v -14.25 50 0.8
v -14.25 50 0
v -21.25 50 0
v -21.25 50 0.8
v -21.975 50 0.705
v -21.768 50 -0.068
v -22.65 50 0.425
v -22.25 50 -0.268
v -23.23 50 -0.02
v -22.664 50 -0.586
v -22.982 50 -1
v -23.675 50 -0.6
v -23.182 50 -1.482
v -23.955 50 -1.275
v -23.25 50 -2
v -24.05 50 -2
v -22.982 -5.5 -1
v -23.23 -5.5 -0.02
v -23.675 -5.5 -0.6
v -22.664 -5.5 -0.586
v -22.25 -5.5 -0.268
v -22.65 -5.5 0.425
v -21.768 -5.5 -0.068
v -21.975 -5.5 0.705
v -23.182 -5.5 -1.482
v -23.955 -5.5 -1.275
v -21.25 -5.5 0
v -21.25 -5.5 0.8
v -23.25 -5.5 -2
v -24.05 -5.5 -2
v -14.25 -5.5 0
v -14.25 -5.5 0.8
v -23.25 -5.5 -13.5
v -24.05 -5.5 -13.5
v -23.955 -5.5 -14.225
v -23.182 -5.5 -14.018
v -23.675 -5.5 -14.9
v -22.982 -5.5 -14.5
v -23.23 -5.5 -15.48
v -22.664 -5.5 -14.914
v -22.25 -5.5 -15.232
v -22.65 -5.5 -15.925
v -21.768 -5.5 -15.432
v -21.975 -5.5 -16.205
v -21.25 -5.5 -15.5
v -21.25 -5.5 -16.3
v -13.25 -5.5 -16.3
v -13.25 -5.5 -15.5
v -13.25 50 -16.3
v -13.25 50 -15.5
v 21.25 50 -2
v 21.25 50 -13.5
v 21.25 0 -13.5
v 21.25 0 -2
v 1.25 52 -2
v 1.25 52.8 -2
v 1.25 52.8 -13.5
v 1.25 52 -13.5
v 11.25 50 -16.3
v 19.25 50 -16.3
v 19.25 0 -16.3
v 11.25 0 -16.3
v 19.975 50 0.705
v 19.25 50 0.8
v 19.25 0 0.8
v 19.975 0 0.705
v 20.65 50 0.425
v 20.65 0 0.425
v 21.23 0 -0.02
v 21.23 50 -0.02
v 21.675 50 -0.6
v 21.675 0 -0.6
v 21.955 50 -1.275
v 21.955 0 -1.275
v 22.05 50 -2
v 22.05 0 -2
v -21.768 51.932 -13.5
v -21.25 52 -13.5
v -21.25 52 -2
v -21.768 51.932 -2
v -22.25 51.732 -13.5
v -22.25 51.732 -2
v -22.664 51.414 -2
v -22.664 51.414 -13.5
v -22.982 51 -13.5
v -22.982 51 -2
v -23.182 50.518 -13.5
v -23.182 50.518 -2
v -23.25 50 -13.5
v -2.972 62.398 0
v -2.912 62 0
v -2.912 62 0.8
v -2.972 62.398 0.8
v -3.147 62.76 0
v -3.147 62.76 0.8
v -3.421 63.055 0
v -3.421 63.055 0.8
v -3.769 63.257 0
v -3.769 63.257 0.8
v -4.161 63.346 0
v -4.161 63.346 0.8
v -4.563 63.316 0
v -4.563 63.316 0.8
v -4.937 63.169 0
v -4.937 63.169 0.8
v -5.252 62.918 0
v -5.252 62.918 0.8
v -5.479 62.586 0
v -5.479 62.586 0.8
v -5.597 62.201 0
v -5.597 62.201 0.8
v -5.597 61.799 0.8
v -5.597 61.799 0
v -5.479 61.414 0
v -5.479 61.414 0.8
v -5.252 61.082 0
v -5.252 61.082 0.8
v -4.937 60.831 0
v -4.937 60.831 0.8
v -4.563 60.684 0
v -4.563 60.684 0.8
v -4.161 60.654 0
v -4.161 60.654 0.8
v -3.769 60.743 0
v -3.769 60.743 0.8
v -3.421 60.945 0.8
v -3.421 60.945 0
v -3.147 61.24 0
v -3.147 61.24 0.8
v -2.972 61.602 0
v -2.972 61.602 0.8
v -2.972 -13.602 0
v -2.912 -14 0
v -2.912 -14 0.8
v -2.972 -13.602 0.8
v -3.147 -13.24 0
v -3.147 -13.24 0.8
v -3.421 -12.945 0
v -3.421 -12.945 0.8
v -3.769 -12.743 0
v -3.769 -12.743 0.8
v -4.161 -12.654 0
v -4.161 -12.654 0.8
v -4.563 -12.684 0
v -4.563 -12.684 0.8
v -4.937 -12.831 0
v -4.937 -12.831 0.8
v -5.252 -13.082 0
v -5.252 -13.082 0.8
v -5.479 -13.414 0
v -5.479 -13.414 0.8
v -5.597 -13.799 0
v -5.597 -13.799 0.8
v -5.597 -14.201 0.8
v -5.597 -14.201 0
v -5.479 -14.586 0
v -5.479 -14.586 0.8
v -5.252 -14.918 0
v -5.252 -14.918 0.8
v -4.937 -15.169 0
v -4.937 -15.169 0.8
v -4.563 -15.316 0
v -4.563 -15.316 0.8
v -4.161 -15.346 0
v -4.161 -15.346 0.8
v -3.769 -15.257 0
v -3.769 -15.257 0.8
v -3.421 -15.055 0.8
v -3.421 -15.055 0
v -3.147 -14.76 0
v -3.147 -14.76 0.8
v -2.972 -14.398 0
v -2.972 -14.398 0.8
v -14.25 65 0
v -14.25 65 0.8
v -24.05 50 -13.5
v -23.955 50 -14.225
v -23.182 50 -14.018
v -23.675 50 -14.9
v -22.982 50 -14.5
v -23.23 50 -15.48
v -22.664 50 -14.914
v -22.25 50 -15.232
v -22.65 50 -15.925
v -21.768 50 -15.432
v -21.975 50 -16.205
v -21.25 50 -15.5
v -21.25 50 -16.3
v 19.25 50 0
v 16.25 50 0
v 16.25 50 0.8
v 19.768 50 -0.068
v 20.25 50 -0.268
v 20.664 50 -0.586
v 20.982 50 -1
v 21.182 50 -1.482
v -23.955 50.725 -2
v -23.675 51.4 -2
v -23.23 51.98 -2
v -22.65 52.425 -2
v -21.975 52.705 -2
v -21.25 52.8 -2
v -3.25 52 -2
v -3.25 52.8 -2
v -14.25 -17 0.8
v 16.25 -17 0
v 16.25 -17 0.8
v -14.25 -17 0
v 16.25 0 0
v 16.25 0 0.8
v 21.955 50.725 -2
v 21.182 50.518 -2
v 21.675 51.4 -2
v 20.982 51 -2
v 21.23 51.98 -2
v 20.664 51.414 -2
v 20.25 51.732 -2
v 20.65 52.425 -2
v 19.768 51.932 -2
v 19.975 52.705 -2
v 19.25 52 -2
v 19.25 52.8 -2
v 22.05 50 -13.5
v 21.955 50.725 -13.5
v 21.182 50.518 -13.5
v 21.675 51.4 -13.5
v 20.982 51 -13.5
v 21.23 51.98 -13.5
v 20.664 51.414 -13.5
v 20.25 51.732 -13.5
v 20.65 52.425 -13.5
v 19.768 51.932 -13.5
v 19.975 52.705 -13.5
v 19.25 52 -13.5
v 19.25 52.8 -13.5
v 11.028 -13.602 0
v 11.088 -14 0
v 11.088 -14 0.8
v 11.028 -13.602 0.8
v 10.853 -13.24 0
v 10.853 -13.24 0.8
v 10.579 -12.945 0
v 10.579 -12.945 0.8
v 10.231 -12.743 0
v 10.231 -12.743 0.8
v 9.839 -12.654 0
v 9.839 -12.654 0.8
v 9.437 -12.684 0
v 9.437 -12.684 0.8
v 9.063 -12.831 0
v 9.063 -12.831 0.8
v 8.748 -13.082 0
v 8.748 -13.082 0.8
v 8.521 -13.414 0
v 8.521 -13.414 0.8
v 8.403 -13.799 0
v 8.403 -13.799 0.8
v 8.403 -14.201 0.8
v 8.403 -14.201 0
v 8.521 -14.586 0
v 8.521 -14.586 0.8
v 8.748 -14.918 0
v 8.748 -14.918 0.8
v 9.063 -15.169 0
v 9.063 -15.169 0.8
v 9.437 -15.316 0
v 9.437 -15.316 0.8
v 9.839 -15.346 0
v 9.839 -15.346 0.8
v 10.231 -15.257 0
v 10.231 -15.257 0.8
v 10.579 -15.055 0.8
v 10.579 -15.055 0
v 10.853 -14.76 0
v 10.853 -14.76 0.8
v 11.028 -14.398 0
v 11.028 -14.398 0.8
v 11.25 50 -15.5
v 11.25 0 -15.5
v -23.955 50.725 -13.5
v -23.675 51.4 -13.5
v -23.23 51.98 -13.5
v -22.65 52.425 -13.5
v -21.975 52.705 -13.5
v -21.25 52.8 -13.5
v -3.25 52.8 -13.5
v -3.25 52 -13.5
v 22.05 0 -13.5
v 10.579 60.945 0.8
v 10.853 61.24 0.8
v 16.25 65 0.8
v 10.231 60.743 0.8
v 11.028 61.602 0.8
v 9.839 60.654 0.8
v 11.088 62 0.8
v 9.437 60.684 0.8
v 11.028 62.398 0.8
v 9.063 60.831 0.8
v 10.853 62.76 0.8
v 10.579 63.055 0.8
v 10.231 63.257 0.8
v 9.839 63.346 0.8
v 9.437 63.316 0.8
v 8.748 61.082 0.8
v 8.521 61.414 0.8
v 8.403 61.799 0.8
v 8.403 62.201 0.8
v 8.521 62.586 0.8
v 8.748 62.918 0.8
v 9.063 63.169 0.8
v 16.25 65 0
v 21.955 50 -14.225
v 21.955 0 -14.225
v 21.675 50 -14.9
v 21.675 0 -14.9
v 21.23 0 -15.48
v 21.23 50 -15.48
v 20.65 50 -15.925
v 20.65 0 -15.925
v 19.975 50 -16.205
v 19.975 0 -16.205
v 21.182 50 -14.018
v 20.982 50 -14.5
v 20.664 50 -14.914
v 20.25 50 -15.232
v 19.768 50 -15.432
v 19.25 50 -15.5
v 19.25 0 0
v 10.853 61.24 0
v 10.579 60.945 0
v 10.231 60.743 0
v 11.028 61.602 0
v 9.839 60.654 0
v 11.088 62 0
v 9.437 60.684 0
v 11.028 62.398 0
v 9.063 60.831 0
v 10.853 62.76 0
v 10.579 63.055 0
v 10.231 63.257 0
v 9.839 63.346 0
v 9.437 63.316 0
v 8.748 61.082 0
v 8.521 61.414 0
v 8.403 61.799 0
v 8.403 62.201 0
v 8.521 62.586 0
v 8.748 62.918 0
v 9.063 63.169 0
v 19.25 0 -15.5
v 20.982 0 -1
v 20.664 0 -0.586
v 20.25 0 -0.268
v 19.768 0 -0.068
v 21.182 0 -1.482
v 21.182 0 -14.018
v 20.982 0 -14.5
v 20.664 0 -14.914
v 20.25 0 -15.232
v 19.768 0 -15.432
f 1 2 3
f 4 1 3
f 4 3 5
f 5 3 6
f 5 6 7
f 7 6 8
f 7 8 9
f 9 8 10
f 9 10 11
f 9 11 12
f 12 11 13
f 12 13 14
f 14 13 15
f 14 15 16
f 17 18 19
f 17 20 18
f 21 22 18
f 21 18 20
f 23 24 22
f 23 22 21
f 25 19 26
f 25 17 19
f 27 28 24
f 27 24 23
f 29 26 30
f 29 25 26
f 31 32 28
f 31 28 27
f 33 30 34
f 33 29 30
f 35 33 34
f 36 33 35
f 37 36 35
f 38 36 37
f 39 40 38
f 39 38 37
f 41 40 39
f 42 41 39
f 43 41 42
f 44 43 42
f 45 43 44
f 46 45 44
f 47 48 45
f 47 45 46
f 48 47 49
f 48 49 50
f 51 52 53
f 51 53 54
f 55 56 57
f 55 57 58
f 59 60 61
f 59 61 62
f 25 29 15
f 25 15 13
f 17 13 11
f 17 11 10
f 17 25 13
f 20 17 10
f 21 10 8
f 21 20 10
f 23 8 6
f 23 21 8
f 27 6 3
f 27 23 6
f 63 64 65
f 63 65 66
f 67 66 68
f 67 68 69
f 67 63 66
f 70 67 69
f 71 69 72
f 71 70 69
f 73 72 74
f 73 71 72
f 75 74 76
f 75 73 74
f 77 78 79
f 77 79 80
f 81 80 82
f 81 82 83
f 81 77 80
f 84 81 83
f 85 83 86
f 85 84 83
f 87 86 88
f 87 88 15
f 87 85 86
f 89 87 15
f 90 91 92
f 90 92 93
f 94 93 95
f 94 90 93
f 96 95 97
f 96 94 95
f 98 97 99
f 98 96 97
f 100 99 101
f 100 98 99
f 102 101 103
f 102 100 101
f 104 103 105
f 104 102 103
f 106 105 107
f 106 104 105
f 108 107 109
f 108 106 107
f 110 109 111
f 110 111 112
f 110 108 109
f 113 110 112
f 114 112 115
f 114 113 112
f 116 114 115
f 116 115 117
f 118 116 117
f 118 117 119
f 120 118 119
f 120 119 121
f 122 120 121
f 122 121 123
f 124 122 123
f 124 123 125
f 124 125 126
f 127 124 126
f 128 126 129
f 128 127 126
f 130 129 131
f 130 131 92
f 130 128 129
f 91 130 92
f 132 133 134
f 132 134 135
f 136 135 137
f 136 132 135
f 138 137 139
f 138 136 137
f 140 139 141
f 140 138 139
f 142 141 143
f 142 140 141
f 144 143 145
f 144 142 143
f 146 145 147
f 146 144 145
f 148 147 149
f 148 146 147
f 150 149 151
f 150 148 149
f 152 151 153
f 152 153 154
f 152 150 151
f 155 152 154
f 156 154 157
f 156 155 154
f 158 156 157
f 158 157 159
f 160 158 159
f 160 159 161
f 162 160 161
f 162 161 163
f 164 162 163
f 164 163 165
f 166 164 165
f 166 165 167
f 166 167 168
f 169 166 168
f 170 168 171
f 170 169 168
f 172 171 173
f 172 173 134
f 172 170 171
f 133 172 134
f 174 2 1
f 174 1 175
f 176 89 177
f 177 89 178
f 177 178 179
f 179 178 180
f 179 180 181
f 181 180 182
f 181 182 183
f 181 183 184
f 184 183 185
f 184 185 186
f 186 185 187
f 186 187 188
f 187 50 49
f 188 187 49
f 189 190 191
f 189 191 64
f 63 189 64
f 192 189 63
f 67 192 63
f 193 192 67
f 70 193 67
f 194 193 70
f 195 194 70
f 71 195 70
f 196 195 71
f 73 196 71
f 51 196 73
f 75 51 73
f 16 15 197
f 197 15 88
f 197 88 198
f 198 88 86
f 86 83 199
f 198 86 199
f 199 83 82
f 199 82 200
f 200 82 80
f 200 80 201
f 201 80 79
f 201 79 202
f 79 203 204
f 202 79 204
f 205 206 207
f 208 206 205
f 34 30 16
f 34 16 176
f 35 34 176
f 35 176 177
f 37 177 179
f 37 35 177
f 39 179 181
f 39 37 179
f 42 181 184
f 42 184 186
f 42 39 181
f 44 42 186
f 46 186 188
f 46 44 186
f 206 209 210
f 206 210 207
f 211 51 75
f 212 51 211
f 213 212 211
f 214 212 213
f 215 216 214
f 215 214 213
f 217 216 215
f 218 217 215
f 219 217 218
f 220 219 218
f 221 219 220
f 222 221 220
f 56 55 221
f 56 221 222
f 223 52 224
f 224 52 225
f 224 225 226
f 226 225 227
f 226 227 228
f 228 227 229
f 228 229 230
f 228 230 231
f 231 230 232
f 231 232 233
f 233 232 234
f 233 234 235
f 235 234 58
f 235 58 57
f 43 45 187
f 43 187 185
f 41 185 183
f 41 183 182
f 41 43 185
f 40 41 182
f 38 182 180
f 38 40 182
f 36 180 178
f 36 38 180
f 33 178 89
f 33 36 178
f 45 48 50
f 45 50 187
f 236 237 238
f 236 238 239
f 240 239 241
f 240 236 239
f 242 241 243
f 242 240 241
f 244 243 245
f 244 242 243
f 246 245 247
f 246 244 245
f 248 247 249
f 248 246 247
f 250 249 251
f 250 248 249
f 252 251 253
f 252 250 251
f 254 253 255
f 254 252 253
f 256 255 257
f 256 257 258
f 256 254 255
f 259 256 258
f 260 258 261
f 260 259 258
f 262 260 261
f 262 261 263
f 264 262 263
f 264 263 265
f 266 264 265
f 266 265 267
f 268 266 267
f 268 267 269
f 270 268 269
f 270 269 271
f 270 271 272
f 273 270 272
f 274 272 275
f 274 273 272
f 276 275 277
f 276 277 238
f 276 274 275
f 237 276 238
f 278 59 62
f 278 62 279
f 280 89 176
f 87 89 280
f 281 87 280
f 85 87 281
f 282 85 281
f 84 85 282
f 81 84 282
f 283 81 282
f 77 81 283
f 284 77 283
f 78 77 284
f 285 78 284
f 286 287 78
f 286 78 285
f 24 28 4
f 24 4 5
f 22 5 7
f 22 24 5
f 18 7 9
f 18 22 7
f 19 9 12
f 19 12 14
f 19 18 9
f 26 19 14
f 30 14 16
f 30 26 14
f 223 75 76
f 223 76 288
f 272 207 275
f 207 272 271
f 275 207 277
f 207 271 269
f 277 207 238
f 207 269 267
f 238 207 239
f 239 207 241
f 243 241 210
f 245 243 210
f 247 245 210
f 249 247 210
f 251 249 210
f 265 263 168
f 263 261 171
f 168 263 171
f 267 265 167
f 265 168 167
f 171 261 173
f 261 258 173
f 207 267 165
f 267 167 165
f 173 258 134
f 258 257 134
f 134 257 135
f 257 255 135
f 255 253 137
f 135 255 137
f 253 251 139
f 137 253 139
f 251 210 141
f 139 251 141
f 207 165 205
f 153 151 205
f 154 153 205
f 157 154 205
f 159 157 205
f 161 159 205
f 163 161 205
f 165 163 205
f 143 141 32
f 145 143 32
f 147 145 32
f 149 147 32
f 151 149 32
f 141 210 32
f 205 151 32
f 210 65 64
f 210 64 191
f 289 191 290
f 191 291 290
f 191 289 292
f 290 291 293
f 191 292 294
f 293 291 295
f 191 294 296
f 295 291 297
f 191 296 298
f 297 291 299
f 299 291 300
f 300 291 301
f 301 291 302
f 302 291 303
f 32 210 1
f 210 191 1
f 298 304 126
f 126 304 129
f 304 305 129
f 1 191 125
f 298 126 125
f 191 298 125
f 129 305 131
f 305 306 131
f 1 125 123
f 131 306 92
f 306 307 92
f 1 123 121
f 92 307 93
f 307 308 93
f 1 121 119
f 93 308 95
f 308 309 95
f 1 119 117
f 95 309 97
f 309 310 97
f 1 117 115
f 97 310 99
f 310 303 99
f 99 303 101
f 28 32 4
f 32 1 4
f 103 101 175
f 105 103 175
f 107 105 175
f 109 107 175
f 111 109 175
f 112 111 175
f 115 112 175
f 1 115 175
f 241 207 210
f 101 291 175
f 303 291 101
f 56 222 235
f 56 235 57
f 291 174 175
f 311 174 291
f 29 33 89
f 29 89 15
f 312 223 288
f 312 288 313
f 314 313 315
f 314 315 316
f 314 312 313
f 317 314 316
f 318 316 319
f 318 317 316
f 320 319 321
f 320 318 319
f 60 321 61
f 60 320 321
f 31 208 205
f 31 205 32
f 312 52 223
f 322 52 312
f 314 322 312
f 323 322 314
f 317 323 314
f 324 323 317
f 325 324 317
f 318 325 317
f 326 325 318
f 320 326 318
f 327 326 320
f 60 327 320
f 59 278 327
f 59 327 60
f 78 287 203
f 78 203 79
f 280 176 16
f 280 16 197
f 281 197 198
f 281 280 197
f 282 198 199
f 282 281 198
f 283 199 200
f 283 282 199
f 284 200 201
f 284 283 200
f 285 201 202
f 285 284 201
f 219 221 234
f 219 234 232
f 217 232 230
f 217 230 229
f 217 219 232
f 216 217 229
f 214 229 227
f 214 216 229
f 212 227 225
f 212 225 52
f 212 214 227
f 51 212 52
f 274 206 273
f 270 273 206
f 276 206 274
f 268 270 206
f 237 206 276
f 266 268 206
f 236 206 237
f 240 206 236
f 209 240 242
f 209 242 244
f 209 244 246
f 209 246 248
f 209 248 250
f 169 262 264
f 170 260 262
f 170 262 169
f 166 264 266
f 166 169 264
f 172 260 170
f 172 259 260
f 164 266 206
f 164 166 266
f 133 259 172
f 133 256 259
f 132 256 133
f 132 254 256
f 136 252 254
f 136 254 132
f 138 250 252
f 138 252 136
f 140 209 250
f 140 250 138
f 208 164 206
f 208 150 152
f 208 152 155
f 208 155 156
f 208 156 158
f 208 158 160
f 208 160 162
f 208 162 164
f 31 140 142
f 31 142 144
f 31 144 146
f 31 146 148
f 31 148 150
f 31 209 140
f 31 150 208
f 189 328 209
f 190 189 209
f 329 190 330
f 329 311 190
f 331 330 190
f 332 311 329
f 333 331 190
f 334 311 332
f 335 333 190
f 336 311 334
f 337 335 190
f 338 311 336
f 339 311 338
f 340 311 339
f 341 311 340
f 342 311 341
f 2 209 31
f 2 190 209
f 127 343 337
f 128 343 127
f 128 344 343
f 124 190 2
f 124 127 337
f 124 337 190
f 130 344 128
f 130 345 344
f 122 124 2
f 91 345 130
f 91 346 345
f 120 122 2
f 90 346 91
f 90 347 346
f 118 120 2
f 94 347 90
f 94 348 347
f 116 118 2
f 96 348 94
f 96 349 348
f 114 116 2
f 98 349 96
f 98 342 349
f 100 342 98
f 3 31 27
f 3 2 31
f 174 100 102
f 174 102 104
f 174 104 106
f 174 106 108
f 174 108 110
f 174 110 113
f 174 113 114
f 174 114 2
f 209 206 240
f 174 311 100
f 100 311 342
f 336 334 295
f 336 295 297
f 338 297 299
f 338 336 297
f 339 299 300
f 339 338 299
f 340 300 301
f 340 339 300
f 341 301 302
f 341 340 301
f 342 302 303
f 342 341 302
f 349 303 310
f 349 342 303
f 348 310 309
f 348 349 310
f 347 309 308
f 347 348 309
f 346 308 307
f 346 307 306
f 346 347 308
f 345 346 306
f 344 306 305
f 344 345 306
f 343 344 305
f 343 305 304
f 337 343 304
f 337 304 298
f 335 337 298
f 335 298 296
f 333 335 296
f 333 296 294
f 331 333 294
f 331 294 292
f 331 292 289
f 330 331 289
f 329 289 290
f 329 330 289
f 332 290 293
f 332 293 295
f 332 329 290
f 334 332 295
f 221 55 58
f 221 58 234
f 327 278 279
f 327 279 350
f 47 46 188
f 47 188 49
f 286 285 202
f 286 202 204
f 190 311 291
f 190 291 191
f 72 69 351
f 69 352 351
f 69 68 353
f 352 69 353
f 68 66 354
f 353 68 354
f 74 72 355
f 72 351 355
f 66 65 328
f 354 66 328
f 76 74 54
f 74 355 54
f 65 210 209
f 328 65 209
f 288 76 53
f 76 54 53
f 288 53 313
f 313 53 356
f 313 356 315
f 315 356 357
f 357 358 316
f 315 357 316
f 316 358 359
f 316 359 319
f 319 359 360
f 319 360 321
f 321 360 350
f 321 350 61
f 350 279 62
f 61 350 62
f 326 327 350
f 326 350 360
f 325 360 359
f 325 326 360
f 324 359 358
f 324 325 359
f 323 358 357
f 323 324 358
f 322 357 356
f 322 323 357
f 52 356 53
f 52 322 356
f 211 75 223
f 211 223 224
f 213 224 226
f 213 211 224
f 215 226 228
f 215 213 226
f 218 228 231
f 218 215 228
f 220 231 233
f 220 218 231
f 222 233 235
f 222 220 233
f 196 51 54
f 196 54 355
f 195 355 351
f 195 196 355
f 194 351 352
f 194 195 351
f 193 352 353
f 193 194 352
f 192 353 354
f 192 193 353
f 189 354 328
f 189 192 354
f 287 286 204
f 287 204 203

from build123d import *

# Parameters (mm, degrees)
SKETCH1_R                      = 1.35
BASE_FLANGE1_DEPTH             = 0.8
EDGE_FLANGE1_STRIP_W           = 7.2
EDGE_FLANGE1_STRIP_H           = 0.8
EDGE_FLANGE1_STRIP_CUT_DEPTH   = 50
EDGE_FLANGE1_STRIP_2_W         = 7.2
EDGE_FLANGE1_STRIP_2_H         = 0.8
EDGE_FLANGE1_STRIP_CUT_2_DEPTH = 55.5
EDGE_FLANGE1_DEPTH             = 50
EDGE_FLANGE1_BEND_DEPTH        = 55.5
EDGE_FLANGE4_DEPTH             = 11.5
EDGE_FLANGE4_BEND_DEPTH        = 11.5
EDGE_FLANGE5_DEPTH             = 50
EDGE_FLANGE5_BEND_DEPTH        = 55.5


# Sheet-metal steps are written as plain solids
with BuildPart() as part:
    # Sketch1 → Base-Flange1 (new body)
    with BuildSketch(Plane.XY):
        Polygon((16.25, 0), (16.25, -17), (-14.25, -17), (-14.25, -5.5), (-23.25, -5.5), (-23.25, 50), (-14.25, 50), (-14.25, 65), (16.25, 65), (16.25, 50), (21.25, 50), (21.25, 0), align=None)
        with Locations((9.737756115, -14)):
            Circle(SKETCH1_R, mode=Mode.SUBTRACT)
        with Locations((-4.262243885, -14)):
            Circle(SKETCH1_R, mode=Mode.SUBTRACT)
        with Locations((9.737756115, 62)):
            Circle(SKETCH1_R, mode=Mode.SUBTRACT)
        with Locations((-4.262243885, 62)):
            Circle(SKETCH1_R, mode=Mode.SUBTRACT)
    extrude(amount=BASE_FLANGE1_DEPTH)

    # Edge-Flange1 strip (across the edge) → Edge-Flange1 strip cut (cut)
    with BuildSketch(Plane(origin=(21.25, 50, 0), x_dir=(-1, 0, 0), z_dir=(0, -1, 0))):
        with Locations((-1.6, -0.4)):
            Rectangle(EDGE_FLANGE1_STRIP_W, EDGE_FLANGE1_STRIP_H)
    extrude(amount=EDGE_FLANGE1_STRIP_CUT_DEPTH, mode=Mode.SUBTRACT)

    # Edge-Flange1 strip 2 (across the edge) → Edge-Flange1 strip cut 2 (cut)
    with BuildSketch(Plane(origin=(-23.25, -5.5, 0), x_dir=(1, 0, 0), z_dir=(0, 1, 0))):
        with Locations((-1.6, -0.4)):
            Rectangle(EDGE_FLANGE1_STRIP_2_W, EDGE_FLANGE1_STRIP_2_H)
    extrude(amount=EDGE_FLANGE1_STRIP_CUT_2_DEPTH, mode=Mode.SUBTRACT)

    # Edge-Flange1 section (across the edge) → Edge-Flange1 (add)
    with BuildSketch(Plane(origin=(21.25, 50, 0), x_dir=(-1, 0, 0), z_dir=(0, -1, 0))):
        with BuildLine():
            Line((-0.8, 2), (-0.8, 13.5))
            Line((-0.8, 13.5), (0, 13.5))
            Line((0, 13.5), (0, 2))
            ThreePointArc((0, 2), (0.585786438, 0.585786438), (2, 0))
            Line((2, 0), (2, -0.8))
            ThreePointArc((2, -0.8), (0.020101013, 0.020101013), (-0.8, 2))
        make_face()
    extrude(amount=EDGE_FLANGE1_DEPTH)

    # Edge-Flange1 section 2 (across the edge) → Edge-Flange1 bend (add)
    with BuildSketch(Plane(origin=(-23.25, -5.5, 0), x_dir=(1, 0, 0), z_dir=(0, 1, 0))):
        with BuildLine():
            Line((-0.8, 2), (-0.8, 13.5))
            Line((-0.8, 13.5), (0, 13.5))
            Line((0, 13.5), (0, 2))
            ThreePointArc((0, 2), (0.585786438, 0.585786438), (2, 0))
            Line((2, 0), (2, -0.8))
            ThreePointArc((2, -0.8), (0.020101013, 0.020101013), (-0.8, 2))
        make_face()
    extrude(amount=EDGE_FLANGE1_BEND_DEPTH)

    # Edge-Flange4 section (across the edge) → Edge-Flange4 (add)
    with BuildSketch(Plane(origin=(21.25, 52, -2), x_dir=(0, -1, 0), z_dir=(0, 0, -1))):
        with BuildLine():
            Line((-0.8, 2), (-0.8, 20))
            Line((-0.8, 20), (0, 20))
            Line((0, 20), (0, 2))
            ThreePointArc((0, 2), (0.585786438, 0.585786438), (2, 0))
            Line((2, 0), (2, -0.8))
            ThreePointArc((2, -0.8), (0.020101013, 0.020101013), (-0.8, 2))
        make_face()
    extrude(amount=EDGE_FLANGE4_DEPTH)

    # Edge-Flange4 section 2 (across the edge) → Edge-Flange4 bend (add)
    with BuildSketch(Plane(origin=(-23.25, 52, -13.5), x_dir=(0, -1, 0), z_dir=(0, 0, 1))):
        with BuildLine():
            Line((-0.8, 2), (-0.8, 20))
            Line((-0.8, 20), (0, 20))
            Line((0, 20), (0, 2))
            ThreePointArc((0, 2), (0.585786438, 0.585786438), (2, 0))
            Line((2, 0), (2, -0.8))
            ThreePointArc((2, -0.8), (0.020101013, 0.020101013), (-0.8, 2))
        make_face()
    extrude(amount=EDGE_FLANGE4_BEND_DEPTH)

    # Edge-Flange5 section (across the edge) → Edge-Flange5 (add)
    with BuildSketch(Plane(origin=(21.25, 50, -15.5), x_dir=(0, 0, 1), z_dir=(0, -1, 0))):
        with BuildLine():
            Line((-0.8, 2), (-0.8, 10))
            Line((-0.8, 10), (0, 10))
            Line((0, 10), (0, 2))
            ThreePointArc((0, 2), (0.585786438, 0.585786438), (2, 0))
            Line((2, 0), (2, -0.8))
            ThreePointArc((2, -0.8), (0.020101013, 0.020101013), (-0.8, 2))
        make_face()
    extrude(amount=EDGE_FLANGE5_DEPTH)

    # Edge-Flange5 section 2 (across the edge) → Edge-Flange5 bend (add)
    with BuildSketch(Plane(origin=(-23.25, -5.5, -15.5), x_dir=(0, 0, 1), z_dir=(0, 1, 0))):
        with BuildLine():
            Line((-0.8, 2), (-0.8, 10))
            Line((-0.8, 10), (0, 10))
            Line((0, 10), (0, 2))
            ThreePointArc((0, 2), (0.585786438, 0.585786438), (2, 0))
            Line((2, 0), (2, -0.8))
            ThreePointArc((2, -0.8), (0.020101013, 0.020101013), (-0.8, 2))
        make_face()
    extrude(amount=EDGE_FLANGE5_BEND_DEPTH)


solid = part.part
